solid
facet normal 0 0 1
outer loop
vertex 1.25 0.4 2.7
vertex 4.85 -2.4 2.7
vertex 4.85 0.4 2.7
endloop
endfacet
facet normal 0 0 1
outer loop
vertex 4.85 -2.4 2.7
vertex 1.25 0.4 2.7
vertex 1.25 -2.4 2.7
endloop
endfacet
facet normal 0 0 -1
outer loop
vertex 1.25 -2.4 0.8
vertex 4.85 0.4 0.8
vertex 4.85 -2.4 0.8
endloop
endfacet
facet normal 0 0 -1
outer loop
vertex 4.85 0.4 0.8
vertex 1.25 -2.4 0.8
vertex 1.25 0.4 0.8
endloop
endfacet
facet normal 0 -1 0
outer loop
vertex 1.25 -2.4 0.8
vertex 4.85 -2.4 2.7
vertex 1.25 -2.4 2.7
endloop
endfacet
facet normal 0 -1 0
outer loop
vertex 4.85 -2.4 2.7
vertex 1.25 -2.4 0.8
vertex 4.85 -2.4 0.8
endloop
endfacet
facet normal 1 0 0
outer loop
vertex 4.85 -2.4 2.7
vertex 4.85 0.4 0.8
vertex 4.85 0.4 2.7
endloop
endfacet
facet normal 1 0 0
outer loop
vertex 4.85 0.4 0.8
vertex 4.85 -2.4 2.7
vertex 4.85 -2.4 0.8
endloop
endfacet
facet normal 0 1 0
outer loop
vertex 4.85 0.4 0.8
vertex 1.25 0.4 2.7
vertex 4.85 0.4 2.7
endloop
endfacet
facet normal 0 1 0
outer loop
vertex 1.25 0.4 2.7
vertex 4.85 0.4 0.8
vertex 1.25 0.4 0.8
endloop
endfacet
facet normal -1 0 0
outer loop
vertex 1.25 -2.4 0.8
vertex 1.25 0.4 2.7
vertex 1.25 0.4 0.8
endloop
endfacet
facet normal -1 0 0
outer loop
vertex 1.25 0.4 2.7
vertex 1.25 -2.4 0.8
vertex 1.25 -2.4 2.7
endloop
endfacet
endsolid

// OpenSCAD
union() {
  translate([1.25, -2.4, 0.8]) cube(size=[3.6,2.8,1.9], center=false);
}
